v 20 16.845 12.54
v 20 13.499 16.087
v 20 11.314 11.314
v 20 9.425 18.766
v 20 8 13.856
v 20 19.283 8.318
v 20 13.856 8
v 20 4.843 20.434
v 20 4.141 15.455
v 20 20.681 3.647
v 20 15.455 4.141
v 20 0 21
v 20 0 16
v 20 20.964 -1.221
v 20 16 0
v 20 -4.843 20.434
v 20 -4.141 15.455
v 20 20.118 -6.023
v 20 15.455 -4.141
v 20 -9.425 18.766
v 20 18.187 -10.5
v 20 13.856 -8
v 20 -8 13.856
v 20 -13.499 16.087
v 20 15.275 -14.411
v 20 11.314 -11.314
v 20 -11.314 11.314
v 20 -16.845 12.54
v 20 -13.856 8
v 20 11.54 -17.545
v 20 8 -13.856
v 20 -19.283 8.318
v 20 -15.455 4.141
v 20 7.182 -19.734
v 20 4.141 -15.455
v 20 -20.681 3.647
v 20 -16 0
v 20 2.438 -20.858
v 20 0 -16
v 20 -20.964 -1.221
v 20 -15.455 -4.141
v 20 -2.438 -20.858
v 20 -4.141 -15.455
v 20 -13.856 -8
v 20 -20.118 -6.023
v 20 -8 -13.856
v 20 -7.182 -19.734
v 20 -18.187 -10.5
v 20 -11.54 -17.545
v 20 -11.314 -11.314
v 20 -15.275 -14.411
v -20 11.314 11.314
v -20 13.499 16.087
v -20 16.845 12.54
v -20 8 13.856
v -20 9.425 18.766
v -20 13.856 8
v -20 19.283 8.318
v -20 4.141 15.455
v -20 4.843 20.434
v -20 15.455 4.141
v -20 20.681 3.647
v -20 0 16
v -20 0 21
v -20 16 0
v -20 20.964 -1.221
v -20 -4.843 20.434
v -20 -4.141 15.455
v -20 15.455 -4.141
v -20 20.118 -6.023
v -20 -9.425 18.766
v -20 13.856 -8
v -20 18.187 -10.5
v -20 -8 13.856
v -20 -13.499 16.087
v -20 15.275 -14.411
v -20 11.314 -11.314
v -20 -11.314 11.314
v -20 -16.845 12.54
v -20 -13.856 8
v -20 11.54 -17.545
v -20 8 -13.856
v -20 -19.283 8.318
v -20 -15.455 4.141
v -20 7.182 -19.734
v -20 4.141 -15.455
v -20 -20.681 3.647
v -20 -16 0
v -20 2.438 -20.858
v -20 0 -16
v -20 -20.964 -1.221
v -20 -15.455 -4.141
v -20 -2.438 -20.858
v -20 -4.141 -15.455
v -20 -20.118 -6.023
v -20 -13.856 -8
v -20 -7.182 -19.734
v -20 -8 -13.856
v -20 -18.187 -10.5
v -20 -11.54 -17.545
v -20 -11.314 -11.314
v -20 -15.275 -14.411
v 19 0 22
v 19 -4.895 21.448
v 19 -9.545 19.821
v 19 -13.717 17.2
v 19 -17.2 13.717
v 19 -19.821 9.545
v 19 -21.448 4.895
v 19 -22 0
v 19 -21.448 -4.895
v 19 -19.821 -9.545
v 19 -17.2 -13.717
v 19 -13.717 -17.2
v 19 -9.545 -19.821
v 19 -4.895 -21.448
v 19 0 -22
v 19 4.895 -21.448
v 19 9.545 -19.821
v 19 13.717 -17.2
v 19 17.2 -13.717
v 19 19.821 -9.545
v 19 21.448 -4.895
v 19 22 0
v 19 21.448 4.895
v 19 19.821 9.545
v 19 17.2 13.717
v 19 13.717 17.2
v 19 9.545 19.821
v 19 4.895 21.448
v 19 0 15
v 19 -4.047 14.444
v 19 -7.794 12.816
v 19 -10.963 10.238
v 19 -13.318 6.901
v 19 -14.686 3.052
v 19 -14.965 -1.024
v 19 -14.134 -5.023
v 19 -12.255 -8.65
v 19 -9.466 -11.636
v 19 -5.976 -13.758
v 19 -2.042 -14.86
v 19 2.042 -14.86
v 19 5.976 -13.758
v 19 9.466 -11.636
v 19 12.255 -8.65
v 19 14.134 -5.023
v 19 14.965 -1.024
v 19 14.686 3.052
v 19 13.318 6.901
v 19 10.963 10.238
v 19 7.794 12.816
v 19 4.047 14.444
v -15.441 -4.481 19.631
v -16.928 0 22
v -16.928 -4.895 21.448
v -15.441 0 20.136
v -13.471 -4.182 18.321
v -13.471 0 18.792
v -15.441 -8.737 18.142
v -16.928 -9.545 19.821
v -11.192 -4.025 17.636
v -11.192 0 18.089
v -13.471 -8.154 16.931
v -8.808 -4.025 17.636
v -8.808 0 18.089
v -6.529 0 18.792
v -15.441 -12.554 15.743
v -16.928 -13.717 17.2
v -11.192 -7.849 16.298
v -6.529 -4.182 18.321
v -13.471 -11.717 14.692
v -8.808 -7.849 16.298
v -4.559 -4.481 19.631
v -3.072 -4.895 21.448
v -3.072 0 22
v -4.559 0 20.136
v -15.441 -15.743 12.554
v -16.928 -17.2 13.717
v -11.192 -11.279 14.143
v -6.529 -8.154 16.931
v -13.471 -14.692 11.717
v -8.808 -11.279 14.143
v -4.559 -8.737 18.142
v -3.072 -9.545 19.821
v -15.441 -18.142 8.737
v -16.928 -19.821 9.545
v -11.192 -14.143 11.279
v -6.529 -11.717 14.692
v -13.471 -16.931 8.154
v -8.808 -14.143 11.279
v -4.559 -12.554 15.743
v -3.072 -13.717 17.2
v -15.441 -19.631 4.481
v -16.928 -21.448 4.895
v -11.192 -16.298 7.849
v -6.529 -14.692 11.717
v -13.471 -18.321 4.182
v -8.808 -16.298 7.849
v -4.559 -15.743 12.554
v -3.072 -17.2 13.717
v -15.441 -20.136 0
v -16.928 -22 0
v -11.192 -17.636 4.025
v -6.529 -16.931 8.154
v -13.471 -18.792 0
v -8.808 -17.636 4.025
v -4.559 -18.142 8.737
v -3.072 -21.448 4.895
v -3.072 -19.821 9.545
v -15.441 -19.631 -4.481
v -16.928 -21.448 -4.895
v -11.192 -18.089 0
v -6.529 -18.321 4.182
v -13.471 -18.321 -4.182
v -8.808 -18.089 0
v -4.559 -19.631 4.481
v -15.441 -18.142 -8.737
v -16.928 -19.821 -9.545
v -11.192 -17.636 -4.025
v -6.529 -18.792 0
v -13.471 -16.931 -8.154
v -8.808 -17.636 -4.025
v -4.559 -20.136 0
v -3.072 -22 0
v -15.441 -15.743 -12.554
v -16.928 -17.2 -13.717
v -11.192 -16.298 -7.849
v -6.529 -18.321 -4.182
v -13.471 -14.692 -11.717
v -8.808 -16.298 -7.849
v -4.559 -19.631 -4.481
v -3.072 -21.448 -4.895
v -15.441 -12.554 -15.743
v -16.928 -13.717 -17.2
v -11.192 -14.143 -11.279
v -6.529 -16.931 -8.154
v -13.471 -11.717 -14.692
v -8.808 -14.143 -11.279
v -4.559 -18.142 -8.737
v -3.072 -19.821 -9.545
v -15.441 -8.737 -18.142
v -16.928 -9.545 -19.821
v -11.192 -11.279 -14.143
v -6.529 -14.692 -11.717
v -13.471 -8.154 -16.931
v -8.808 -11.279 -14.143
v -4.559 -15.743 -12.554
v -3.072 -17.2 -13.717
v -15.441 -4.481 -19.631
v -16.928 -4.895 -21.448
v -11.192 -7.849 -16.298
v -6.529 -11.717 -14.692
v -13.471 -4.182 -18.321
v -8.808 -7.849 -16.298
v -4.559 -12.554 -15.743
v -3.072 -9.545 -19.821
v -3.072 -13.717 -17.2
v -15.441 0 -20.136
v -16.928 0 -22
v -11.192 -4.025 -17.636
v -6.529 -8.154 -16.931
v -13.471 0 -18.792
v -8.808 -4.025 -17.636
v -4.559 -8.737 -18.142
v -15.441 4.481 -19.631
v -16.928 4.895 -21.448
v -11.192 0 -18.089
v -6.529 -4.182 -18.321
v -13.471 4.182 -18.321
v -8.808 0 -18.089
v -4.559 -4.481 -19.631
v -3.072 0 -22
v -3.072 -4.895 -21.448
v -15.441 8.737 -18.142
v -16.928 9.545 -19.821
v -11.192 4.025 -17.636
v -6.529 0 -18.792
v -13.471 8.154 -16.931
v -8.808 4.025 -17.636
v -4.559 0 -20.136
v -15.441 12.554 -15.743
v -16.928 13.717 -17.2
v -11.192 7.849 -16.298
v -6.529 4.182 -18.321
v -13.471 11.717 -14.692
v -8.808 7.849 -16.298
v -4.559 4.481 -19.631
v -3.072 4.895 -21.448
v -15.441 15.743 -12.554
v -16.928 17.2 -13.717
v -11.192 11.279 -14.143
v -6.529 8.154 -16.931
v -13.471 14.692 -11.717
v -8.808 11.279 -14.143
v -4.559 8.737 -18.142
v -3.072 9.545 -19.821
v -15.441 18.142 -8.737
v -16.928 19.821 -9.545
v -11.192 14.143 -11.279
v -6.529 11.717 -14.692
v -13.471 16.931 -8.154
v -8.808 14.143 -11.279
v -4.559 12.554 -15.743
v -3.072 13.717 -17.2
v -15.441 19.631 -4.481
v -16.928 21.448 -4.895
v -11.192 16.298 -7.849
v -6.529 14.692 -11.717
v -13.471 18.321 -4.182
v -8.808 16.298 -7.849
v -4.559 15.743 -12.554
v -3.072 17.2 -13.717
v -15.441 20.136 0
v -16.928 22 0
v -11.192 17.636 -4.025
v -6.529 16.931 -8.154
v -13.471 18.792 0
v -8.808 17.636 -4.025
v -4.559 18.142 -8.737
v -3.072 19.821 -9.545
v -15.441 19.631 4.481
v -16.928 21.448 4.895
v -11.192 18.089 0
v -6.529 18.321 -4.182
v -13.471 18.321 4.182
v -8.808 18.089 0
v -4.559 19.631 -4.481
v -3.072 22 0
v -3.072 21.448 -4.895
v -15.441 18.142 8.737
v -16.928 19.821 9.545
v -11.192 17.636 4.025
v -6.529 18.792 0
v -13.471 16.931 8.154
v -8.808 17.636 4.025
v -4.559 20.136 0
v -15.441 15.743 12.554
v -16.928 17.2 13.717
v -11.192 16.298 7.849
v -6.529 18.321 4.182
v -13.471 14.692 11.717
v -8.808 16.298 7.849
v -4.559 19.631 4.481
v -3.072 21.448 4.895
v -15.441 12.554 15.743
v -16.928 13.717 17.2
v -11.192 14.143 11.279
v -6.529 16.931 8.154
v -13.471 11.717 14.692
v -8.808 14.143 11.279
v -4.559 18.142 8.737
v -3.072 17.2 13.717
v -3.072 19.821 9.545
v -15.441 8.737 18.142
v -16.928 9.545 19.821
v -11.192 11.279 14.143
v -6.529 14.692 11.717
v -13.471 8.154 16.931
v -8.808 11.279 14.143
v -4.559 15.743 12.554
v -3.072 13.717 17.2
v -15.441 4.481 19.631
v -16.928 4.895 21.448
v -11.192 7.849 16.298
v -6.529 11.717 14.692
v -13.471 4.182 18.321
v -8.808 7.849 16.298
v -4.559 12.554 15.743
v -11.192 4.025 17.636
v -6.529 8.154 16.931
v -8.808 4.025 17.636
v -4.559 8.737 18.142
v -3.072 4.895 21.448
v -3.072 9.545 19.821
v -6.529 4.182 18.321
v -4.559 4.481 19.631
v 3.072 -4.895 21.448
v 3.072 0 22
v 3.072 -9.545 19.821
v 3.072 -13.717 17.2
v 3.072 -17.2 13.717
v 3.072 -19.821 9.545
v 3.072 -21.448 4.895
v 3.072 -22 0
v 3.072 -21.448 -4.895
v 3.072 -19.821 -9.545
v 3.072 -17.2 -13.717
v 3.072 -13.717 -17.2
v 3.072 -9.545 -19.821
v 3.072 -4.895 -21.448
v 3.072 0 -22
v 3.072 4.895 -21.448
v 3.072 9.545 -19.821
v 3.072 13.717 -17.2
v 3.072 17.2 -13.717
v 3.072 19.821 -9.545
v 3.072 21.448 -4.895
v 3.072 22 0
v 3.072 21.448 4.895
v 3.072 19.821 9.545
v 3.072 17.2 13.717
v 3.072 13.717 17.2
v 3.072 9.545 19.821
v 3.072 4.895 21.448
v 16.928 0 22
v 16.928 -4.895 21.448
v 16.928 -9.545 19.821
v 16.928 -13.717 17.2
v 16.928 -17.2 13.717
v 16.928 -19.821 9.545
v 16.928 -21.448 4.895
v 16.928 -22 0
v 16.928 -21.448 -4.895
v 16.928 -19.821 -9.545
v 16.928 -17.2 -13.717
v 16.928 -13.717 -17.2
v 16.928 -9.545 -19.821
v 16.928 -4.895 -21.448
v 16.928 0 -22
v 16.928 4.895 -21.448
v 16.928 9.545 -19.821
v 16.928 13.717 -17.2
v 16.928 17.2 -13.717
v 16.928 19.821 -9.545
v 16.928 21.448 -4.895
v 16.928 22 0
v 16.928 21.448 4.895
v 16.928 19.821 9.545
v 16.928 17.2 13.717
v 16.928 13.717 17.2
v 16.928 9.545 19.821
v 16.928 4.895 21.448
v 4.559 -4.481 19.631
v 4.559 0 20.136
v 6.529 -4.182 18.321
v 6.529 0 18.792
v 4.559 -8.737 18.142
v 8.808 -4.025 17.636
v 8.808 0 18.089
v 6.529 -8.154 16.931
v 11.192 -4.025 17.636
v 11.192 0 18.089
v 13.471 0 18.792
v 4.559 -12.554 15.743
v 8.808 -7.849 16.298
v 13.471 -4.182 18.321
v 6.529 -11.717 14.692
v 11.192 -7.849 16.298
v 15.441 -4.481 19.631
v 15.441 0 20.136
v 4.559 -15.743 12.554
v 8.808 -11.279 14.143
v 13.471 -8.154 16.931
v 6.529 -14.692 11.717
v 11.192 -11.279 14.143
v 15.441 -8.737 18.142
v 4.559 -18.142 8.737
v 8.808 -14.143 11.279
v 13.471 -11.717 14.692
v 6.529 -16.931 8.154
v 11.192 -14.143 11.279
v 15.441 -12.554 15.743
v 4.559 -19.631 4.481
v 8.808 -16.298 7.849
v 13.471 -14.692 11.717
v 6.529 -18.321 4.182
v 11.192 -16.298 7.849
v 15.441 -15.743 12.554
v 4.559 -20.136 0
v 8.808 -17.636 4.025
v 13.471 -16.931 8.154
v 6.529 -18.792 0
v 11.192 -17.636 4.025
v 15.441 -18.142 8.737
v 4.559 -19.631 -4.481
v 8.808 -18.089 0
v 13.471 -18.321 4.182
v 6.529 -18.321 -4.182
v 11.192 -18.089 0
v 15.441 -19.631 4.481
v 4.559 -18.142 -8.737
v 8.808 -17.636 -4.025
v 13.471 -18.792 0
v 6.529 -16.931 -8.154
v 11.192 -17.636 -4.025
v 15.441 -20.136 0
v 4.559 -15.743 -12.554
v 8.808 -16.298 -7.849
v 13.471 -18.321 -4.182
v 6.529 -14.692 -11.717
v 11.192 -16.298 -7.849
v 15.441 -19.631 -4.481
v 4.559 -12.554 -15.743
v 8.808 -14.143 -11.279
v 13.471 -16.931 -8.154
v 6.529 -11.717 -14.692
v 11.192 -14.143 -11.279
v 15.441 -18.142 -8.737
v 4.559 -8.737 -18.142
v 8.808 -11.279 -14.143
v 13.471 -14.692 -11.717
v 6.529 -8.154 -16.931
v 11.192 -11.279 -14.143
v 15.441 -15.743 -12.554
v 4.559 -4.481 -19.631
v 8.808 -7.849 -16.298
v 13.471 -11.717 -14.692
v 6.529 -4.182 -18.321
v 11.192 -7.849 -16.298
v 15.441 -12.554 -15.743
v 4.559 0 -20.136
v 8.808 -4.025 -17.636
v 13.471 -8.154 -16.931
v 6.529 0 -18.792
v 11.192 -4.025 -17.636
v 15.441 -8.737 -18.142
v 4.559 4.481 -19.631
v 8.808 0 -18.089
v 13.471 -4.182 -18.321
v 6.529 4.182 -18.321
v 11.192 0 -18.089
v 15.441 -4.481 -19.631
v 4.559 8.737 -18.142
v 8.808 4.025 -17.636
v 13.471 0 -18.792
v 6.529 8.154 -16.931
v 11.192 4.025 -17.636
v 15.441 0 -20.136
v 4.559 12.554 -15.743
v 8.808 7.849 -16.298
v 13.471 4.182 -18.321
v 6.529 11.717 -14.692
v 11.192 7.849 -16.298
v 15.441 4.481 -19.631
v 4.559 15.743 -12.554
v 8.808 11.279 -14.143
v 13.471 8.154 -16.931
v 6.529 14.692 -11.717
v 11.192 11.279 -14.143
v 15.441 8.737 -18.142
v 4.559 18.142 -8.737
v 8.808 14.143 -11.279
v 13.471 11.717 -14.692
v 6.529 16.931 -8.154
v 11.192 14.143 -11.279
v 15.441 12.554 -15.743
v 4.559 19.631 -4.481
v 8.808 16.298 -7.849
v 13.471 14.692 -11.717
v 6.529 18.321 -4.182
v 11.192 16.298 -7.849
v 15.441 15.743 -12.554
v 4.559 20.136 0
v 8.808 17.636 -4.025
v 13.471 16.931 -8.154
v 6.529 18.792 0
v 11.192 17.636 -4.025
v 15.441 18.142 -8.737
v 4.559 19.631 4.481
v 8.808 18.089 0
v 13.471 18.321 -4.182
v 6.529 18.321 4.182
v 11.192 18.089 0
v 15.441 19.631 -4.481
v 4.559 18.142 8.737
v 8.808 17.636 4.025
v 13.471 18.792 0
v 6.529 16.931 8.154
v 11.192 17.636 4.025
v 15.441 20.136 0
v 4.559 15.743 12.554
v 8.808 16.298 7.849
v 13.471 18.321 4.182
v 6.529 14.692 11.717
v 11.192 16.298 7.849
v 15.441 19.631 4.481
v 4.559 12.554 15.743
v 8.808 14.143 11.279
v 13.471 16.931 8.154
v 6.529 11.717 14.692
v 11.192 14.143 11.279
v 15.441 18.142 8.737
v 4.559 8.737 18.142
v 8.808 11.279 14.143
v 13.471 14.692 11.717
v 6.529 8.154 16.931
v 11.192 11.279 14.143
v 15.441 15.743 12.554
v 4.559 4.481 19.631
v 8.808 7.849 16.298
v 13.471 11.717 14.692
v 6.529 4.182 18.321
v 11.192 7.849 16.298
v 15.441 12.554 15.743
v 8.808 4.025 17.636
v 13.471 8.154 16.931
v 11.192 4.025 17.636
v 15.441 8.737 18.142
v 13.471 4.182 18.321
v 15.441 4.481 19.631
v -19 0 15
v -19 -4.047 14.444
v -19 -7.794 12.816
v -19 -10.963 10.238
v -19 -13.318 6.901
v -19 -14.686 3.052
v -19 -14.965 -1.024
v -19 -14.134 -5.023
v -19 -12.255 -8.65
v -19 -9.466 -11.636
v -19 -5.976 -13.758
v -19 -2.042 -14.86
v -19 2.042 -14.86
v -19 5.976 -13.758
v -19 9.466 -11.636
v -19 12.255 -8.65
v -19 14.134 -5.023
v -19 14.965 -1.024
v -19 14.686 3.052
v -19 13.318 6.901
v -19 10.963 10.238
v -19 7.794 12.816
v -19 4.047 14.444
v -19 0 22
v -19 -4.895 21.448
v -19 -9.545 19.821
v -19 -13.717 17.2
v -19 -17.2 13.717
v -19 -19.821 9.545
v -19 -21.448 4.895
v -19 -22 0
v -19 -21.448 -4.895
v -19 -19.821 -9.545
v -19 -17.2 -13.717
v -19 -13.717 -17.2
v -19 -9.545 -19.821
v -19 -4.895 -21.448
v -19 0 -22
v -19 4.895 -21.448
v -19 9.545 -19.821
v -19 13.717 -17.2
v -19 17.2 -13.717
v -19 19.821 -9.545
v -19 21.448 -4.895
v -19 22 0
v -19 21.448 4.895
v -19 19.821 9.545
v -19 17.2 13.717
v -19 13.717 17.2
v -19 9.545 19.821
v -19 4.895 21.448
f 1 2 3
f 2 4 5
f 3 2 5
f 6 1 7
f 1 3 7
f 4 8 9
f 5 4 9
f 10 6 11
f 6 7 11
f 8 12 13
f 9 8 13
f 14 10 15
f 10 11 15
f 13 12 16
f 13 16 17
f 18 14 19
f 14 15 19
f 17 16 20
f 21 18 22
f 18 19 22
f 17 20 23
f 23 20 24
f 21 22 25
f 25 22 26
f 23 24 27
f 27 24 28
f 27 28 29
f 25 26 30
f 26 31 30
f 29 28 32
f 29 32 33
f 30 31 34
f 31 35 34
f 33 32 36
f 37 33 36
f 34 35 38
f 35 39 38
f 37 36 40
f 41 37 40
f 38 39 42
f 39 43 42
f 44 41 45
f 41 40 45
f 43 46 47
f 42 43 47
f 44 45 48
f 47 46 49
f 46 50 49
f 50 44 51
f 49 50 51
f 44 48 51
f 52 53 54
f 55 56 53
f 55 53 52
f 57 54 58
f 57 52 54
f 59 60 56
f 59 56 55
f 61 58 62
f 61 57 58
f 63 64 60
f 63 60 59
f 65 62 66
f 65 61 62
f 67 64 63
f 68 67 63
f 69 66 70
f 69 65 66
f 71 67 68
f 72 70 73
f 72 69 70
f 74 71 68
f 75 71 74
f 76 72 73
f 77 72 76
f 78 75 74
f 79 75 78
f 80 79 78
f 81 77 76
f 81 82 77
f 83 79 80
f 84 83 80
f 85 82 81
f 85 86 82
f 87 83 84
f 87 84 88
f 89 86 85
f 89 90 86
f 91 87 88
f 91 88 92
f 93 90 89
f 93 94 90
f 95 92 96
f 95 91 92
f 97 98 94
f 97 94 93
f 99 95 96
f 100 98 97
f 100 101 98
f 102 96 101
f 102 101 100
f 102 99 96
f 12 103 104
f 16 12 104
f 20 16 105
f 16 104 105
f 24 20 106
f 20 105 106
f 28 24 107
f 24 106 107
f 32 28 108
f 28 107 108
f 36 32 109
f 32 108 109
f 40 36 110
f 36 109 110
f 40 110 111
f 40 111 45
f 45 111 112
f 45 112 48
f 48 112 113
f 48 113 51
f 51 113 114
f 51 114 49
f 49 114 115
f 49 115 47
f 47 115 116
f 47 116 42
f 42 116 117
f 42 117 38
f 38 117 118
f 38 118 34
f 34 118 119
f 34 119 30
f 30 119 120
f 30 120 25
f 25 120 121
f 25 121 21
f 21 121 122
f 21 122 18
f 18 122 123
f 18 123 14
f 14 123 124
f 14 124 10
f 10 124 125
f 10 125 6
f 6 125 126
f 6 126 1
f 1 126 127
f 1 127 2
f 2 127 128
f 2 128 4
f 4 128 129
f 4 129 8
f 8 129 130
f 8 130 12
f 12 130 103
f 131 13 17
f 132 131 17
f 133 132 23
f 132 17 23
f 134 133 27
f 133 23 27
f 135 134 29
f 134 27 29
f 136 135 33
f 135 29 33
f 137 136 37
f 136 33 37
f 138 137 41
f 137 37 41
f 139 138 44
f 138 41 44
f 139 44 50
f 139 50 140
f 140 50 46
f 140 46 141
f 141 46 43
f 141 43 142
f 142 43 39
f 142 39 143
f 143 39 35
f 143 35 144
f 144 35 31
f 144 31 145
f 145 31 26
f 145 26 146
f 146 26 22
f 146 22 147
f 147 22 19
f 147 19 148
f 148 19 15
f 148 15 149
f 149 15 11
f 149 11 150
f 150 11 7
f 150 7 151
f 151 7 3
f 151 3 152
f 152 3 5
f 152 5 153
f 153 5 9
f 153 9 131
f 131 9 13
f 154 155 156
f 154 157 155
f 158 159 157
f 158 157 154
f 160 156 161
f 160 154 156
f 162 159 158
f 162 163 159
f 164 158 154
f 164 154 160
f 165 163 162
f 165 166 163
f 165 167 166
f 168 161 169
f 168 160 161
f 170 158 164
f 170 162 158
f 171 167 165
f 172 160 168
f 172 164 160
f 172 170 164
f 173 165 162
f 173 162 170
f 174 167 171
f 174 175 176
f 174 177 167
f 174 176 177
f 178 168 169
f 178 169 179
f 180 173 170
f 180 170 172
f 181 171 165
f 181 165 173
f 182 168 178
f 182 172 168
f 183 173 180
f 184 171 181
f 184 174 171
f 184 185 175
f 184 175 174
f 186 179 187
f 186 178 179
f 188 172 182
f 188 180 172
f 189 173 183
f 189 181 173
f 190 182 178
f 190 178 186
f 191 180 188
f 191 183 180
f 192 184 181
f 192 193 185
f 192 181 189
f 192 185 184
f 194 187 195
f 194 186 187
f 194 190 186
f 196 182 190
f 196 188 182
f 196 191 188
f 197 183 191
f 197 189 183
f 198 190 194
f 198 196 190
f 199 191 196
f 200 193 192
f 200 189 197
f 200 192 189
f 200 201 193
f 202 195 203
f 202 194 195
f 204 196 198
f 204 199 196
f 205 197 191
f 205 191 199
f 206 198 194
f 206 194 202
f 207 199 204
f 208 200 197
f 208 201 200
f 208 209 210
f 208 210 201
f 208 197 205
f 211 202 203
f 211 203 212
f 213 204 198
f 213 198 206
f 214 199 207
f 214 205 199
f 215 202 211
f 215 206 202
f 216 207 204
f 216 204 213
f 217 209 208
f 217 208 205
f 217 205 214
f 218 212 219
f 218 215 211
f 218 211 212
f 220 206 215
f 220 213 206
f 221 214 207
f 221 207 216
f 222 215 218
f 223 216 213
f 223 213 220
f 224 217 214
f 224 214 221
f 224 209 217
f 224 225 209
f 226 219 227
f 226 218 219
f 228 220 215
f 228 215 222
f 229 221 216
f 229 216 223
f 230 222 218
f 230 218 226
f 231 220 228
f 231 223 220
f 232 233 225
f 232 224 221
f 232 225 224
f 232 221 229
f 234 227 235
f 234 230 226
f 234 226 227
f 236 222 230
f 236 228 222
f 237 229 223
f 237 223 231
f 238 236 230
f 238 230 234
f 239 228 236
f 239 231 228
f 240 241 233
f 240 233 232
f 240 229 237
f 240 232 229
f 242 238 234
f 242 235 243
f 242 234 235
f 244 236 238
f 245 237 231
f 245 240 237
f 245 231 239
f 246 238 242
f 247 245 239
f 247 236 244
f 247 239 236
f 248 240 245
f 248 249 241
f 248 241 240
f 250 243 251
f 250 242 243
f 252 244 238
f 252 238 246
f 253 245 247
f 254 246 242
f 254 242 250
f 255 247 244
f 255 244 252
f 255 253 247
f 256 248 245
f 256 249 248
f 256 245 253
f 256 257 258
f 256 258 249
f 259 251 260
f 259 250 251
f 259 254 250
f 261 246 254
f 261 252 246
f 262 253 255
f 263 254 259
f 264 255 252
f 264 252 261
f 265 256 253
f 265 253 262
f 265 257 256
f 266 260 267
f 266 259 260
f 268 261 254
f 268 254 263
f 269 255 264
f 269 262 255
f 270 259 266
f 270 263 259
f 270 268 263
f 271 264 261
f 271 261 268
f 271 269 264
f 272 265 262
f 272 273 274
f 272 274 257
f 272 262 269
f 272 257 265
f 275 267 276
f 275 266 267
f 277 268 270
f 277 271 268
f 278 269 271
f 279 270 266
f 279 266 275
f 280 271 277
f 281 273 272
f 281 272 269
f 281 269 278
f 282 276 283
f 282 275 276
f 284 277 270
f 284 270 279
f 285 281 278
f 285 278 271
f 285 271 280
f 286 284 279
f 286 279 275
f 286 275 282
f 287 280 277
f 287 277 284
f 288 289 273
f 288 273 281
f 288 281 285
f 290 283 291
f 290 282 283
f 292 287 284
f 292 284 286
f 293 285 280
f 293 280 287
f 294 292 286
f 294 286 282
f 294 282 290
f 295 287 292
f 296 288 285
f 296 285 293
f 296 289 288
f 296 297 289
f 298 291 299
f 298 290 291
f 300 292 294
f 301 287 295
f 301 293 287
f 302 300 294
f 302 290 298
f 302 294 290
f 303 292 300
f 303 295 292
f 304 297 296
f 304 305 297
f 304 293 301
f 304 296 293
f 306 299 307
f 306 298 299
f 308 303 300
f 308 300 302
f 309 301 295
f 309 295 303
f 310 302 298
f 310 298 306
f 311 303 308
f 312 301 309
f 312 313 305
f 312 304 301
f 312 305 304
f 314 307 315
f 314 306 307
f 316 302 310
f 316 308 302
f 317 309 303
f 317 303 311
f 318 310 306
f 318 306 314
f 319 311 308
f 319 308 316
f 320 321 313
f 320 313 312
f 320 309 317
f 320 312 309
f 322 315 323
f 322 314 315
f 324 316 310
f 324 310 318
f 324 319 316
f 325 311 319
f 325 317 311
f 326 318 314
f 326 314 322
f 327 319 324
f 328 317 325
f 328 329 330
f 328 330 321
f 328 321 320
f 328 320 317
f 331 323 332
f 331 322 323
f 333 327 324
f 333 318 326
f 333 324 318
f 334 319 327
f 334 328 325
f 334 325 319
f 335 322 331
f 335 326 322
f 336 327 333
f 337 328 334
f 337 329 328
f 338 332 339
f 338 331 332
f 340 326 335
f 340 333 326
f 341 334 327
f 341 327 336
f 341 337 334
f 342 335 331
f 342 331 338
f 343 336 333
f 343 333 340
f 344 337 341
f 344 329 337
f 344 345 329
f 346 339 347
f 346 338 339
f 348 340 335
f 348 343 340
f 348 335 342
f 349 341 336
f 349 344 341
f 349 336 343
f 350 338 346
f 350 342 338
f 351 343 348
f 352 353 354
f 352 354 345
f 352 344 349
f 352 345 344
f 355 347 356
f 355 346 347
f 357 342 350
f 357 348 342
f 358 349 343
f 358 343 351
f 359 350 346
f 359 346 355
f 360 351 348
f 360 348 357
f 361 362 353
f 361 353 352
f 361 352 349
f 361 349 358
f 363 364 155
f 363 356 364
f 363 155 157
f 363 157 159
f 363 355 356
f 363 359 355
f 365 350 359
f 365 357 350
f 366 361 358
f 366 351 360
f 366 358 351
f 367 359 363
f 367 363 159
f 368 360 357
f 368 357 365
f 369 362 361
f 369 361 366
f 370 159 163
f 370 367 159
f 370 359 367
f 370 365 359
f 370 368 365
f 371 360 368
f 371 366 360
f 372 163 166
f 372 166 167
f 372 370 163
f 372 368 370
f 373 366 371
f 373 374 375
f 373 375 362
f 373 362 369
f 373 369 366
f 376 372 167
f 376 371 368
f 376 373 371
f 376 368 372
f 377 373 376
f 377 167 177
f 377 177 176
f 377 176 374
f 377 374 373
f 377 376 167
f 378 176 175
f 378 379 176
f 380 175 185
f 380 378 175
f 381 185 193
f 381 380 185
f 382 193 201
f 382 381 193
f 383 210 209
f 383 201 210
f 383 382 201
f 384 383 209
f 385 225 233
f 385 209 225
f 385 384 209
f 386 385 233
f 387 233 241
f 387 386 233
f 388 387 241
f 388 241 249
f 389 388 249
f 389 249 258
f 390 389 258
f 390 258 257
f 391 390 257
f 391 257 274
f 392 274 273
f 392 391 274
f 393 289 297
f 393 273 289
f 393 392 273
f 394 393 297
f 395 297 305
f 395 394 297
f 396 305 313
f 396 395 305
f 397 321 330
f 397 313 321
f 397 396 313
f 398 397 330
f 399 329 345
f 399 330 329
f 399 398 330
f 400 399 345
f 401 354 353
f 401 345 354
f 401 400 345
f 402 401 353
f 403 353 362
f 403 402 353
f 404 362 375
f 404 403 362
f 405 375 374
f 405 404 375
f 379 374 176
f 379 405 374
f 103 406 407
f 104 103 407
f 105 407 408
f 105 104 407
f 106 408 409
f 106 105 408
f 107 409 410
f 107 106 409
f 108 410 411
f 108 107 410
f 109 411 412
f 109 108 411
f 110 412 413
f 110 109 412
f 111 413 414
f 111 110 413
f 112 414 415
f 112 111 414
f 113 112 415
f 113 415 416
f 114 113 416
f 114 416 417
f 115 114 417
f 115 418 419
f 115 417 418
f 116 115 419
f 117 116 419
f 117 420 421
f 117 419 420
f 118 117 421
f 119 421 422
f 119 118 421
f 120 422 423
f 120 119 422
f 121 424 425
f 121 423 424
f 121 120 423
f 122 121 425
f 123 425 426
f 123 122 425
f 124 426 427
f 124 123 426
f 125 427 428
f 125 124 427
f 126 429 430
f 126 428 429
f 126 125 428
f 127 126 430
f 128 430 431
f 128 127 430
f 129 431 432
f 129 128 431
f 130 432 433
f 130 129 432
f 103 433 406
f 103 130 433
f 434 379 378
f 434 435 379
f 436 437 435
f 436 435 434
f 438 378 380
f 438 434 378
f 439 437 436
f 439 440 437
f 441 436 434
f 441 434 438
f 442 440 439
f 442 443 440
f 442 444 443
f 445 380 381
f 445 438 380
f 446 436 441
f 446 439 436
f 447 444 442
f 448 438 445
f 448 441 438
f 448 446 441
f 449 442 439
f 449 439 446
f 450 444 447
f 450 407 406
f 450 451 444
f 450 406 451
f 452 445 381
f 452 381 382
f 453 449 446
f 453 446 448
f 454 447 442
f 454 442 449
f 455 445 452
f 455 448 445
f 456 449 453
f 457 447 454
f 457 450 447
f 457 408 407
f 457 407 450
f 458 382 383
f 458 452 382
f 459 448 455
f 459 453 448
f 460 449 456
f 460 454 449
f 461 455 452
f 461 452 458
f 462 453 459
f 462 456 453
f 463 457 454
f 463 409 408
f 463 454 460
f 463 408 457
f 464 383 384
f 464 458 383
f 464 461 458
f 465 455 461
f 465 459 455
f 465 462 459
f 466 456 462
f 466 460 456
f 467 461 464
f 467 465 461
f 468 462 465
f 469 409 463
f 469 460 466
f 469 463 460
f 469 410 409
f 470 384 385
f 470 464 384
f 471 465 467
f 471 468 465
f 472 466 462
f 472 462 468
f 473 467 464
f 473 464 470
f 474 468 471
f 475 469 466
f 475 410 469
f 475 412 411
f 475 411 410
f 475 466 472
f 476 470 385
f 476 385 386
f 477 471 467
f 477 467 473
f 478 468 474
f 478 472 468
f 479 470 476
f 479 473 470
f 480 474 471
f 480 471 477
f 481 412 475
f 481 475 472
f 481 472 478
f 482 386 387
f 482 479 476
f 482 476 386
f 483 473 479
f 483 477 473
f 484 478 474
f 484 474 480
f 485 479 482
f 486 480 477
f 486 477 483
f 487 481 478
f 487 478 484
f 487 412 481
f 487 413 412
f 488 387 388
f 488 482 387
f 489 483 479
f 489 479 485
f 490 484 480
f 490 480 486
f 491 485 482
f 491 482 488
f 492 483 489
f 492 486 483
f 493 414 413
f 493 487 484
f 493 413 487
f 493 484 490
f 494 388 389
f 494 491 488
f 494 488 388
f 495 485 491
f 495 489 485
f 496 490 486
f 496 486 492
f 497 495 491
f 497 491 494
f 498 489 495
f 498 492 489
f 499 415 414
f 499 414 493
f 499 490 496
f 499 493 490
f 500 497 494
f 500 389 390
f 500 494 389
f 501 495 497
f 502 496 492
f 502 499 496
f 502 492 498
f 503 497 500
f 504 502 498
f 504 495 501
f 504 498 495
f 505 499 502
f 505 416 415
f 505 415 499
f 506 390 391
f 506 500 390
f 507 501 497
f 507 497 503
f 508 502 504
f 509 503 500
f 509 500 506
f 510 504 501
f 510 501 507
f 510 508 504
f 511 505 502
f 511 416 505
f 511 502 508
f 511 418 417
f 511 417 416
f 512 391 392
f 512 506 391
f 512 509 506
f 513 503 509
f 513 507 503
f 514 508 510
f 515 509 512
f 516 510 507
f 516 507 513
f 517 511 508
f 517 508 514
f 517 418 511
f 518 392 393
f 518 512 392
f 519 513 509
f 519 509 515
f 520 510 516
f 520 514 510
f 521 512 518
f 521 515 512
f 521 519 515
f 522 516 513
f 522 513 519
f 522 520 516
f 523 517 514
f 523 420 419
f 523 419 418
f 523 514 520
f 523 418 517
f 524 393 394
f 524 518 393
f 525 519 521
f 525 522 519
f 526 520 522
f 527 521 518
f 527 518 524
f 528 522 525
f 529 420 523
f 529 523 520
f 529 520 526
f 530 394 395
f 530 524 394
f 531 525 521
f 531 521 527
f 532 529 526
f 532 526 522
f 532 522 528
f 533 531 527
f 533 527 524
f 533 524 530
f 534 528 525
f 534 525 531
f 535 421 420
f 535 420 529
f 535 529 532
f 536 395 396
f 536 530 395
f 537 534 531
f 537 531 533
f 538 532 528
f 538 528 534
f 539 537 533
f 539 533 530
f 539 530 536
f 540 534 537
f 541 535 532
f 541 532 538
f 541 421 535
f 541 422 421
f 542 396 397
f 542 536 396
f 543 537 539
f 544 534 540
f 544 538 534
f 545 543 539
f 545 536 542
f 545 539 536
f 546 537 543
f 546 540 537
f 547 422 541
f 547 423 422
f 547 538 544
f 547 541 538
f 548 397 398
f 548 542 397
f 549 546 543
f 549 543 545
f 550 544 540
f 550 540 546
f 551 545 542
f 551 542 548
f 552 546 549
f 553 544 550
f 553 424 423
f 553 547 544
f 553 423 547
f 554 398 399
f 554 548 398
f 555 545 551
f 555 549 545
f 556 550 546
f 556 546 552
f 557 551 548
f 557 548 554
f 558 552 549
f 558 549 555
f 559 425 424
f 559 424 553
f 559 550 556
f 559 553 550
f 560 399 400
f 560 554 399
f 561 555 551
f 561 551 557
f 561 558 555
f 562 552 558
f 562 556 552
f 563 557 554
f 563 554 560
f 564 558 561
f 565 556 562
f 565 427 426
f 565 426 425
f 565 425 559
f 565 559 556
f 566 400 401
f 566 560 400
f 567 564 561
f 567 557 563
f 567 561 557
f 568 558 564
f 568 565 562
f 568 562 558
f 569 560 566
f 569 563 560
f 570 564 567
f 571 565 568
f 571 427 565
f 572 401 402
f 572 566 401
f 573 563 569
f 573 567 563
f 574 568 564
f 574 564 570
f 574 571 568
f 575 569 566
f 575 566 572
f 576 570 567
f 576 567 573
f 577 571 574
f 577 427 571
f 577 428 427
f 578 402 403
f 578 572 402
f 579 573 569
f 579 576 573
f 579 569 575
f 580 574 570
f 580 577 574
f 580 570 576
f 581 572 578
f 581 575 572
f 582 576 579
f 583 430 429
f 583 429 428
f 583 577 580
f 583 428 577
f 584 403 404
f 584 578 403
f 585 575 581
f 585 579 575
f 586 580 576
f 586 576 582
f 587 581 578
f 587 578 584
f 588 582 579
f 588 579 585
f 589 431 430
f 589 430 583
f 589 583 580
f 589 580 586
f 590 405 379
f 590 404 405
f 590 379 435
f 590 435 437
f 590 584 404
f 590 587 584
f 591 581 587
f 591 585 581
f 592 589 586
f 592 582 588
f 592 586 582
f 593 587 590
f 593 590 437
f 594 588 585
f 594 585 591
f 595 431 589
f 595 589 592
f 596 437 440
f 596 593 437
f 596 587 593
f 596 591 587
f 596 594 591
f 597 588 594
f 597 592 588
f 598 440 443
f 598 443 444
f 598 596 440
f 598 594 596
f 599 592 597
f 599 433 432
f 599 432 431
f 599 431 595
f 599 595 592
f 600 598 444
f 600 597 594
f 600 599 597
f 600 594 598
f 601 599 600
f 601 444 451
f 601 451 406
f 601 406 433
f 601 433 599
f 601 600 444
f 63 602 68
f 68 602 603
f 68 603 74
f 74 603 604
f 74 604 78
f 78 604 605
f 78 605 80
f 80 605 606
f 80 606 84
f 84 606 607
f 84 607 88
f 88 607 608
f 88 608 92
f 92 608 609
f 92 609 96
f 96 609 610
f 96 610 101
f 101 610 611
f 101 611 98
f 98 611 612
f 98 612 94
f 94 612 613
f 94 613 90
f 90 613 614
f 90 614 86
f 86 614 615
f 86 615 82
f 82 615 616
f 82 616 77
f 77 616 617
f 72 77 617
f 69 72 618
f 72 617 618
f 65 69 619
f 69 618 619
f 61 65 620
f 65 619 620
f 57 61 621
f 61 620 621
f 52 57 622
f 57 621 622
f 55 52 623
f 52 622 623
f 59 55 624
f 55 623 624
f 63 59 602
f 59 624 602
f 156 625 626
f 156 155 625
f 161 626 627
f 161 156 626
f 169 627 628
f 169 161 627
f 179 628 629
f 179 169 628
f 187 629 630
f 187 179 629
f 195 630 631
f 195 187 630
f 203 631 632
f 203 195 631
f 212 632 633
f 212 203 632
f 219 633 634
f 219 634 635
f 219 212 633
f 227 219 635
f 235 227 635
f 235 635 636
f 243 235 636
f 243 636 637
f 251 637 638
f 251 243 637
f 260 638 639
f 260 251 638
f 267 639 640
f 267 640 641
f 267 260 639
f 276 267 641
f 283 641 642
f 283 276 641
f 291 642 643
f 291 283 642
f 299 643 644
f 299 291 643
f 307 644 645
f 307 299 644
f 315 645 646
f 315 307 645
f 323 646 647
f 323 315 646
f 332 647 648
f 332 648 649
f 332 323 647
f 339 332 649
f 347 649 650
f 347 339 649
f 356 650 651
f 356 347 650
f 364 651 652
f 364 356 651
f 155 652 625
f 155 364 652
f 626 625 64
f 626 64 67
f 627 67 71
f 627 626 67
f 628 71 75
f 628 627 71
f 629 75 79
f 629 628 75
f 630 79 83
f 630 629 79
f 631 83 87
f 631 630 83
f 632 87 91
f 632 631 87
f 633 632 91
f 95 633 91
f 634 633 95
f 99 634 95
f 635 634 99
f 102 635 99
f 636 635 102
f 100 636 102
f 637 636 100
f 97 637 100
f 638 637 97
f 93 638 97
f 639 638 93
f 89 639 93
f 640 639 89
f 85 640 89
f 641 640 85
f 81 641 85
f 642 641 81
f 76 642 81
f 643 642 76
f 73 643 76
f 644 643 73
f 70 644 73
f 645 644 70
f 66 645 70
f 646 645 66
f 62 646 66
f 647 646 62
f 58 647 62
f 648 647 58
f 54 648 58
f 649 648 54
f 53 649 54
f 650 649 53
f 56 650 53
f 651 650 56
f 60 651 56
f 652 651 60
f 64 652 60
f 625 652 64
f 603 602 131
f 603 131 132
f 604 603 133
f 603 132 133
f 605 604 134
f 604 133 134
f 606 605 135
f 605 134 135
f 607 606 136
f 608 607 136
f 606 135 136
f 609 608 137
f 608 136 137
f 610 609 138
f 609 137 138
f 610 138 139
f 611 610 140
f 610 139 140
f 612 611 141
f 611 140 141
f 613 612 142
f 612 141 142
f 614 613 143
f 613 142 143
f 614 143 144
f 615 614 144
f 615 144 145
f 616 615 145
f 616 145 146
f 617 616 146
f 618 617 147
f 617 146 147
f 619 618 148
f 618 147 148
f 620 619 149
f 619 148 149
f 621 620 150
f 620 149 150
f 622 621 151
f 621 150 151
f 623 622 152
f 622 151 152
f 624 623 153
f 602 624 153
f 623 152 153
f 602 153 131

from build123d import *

# Parameters (mm, degrees)
F1_W    = 40
F1_H    = 7
F3_SIZE = 1
F0_R    = 8


with BuildPart() as f2:
    # F1 (on Front) → F2 (revolve)
    with BuildSketch(Plane.XZ):
        with Locations((0, 18.5)):
            Rectangle(F1_W, F1_H)
    revolve(axis=Axis((0, 0, 0), (1, 0, 0)))

    # F3
    f3_edges = [f2.edges().sort_by_distance(p)[0] for p in [
        (-20, 0, -22),
        (-20, 0, -15),
        (20, 0, -22),
        (20, 0, -15),
    ]]
    chamfer(f3_edges, length=F3_SIZE)

    # F0 (on Front) → F4 (revolve, cut)
    with BuildSketch(Plane.XZ):
        with Locations((-10, 26)):
            Circle(F0_R)
        with Locations((10, 26)):
            Circle(F0_R)
    revolve(axis=Axis((0, 0, 0), (1, 0, 0)), mode=Mode.SUBTRACT)


solid = f2.part
